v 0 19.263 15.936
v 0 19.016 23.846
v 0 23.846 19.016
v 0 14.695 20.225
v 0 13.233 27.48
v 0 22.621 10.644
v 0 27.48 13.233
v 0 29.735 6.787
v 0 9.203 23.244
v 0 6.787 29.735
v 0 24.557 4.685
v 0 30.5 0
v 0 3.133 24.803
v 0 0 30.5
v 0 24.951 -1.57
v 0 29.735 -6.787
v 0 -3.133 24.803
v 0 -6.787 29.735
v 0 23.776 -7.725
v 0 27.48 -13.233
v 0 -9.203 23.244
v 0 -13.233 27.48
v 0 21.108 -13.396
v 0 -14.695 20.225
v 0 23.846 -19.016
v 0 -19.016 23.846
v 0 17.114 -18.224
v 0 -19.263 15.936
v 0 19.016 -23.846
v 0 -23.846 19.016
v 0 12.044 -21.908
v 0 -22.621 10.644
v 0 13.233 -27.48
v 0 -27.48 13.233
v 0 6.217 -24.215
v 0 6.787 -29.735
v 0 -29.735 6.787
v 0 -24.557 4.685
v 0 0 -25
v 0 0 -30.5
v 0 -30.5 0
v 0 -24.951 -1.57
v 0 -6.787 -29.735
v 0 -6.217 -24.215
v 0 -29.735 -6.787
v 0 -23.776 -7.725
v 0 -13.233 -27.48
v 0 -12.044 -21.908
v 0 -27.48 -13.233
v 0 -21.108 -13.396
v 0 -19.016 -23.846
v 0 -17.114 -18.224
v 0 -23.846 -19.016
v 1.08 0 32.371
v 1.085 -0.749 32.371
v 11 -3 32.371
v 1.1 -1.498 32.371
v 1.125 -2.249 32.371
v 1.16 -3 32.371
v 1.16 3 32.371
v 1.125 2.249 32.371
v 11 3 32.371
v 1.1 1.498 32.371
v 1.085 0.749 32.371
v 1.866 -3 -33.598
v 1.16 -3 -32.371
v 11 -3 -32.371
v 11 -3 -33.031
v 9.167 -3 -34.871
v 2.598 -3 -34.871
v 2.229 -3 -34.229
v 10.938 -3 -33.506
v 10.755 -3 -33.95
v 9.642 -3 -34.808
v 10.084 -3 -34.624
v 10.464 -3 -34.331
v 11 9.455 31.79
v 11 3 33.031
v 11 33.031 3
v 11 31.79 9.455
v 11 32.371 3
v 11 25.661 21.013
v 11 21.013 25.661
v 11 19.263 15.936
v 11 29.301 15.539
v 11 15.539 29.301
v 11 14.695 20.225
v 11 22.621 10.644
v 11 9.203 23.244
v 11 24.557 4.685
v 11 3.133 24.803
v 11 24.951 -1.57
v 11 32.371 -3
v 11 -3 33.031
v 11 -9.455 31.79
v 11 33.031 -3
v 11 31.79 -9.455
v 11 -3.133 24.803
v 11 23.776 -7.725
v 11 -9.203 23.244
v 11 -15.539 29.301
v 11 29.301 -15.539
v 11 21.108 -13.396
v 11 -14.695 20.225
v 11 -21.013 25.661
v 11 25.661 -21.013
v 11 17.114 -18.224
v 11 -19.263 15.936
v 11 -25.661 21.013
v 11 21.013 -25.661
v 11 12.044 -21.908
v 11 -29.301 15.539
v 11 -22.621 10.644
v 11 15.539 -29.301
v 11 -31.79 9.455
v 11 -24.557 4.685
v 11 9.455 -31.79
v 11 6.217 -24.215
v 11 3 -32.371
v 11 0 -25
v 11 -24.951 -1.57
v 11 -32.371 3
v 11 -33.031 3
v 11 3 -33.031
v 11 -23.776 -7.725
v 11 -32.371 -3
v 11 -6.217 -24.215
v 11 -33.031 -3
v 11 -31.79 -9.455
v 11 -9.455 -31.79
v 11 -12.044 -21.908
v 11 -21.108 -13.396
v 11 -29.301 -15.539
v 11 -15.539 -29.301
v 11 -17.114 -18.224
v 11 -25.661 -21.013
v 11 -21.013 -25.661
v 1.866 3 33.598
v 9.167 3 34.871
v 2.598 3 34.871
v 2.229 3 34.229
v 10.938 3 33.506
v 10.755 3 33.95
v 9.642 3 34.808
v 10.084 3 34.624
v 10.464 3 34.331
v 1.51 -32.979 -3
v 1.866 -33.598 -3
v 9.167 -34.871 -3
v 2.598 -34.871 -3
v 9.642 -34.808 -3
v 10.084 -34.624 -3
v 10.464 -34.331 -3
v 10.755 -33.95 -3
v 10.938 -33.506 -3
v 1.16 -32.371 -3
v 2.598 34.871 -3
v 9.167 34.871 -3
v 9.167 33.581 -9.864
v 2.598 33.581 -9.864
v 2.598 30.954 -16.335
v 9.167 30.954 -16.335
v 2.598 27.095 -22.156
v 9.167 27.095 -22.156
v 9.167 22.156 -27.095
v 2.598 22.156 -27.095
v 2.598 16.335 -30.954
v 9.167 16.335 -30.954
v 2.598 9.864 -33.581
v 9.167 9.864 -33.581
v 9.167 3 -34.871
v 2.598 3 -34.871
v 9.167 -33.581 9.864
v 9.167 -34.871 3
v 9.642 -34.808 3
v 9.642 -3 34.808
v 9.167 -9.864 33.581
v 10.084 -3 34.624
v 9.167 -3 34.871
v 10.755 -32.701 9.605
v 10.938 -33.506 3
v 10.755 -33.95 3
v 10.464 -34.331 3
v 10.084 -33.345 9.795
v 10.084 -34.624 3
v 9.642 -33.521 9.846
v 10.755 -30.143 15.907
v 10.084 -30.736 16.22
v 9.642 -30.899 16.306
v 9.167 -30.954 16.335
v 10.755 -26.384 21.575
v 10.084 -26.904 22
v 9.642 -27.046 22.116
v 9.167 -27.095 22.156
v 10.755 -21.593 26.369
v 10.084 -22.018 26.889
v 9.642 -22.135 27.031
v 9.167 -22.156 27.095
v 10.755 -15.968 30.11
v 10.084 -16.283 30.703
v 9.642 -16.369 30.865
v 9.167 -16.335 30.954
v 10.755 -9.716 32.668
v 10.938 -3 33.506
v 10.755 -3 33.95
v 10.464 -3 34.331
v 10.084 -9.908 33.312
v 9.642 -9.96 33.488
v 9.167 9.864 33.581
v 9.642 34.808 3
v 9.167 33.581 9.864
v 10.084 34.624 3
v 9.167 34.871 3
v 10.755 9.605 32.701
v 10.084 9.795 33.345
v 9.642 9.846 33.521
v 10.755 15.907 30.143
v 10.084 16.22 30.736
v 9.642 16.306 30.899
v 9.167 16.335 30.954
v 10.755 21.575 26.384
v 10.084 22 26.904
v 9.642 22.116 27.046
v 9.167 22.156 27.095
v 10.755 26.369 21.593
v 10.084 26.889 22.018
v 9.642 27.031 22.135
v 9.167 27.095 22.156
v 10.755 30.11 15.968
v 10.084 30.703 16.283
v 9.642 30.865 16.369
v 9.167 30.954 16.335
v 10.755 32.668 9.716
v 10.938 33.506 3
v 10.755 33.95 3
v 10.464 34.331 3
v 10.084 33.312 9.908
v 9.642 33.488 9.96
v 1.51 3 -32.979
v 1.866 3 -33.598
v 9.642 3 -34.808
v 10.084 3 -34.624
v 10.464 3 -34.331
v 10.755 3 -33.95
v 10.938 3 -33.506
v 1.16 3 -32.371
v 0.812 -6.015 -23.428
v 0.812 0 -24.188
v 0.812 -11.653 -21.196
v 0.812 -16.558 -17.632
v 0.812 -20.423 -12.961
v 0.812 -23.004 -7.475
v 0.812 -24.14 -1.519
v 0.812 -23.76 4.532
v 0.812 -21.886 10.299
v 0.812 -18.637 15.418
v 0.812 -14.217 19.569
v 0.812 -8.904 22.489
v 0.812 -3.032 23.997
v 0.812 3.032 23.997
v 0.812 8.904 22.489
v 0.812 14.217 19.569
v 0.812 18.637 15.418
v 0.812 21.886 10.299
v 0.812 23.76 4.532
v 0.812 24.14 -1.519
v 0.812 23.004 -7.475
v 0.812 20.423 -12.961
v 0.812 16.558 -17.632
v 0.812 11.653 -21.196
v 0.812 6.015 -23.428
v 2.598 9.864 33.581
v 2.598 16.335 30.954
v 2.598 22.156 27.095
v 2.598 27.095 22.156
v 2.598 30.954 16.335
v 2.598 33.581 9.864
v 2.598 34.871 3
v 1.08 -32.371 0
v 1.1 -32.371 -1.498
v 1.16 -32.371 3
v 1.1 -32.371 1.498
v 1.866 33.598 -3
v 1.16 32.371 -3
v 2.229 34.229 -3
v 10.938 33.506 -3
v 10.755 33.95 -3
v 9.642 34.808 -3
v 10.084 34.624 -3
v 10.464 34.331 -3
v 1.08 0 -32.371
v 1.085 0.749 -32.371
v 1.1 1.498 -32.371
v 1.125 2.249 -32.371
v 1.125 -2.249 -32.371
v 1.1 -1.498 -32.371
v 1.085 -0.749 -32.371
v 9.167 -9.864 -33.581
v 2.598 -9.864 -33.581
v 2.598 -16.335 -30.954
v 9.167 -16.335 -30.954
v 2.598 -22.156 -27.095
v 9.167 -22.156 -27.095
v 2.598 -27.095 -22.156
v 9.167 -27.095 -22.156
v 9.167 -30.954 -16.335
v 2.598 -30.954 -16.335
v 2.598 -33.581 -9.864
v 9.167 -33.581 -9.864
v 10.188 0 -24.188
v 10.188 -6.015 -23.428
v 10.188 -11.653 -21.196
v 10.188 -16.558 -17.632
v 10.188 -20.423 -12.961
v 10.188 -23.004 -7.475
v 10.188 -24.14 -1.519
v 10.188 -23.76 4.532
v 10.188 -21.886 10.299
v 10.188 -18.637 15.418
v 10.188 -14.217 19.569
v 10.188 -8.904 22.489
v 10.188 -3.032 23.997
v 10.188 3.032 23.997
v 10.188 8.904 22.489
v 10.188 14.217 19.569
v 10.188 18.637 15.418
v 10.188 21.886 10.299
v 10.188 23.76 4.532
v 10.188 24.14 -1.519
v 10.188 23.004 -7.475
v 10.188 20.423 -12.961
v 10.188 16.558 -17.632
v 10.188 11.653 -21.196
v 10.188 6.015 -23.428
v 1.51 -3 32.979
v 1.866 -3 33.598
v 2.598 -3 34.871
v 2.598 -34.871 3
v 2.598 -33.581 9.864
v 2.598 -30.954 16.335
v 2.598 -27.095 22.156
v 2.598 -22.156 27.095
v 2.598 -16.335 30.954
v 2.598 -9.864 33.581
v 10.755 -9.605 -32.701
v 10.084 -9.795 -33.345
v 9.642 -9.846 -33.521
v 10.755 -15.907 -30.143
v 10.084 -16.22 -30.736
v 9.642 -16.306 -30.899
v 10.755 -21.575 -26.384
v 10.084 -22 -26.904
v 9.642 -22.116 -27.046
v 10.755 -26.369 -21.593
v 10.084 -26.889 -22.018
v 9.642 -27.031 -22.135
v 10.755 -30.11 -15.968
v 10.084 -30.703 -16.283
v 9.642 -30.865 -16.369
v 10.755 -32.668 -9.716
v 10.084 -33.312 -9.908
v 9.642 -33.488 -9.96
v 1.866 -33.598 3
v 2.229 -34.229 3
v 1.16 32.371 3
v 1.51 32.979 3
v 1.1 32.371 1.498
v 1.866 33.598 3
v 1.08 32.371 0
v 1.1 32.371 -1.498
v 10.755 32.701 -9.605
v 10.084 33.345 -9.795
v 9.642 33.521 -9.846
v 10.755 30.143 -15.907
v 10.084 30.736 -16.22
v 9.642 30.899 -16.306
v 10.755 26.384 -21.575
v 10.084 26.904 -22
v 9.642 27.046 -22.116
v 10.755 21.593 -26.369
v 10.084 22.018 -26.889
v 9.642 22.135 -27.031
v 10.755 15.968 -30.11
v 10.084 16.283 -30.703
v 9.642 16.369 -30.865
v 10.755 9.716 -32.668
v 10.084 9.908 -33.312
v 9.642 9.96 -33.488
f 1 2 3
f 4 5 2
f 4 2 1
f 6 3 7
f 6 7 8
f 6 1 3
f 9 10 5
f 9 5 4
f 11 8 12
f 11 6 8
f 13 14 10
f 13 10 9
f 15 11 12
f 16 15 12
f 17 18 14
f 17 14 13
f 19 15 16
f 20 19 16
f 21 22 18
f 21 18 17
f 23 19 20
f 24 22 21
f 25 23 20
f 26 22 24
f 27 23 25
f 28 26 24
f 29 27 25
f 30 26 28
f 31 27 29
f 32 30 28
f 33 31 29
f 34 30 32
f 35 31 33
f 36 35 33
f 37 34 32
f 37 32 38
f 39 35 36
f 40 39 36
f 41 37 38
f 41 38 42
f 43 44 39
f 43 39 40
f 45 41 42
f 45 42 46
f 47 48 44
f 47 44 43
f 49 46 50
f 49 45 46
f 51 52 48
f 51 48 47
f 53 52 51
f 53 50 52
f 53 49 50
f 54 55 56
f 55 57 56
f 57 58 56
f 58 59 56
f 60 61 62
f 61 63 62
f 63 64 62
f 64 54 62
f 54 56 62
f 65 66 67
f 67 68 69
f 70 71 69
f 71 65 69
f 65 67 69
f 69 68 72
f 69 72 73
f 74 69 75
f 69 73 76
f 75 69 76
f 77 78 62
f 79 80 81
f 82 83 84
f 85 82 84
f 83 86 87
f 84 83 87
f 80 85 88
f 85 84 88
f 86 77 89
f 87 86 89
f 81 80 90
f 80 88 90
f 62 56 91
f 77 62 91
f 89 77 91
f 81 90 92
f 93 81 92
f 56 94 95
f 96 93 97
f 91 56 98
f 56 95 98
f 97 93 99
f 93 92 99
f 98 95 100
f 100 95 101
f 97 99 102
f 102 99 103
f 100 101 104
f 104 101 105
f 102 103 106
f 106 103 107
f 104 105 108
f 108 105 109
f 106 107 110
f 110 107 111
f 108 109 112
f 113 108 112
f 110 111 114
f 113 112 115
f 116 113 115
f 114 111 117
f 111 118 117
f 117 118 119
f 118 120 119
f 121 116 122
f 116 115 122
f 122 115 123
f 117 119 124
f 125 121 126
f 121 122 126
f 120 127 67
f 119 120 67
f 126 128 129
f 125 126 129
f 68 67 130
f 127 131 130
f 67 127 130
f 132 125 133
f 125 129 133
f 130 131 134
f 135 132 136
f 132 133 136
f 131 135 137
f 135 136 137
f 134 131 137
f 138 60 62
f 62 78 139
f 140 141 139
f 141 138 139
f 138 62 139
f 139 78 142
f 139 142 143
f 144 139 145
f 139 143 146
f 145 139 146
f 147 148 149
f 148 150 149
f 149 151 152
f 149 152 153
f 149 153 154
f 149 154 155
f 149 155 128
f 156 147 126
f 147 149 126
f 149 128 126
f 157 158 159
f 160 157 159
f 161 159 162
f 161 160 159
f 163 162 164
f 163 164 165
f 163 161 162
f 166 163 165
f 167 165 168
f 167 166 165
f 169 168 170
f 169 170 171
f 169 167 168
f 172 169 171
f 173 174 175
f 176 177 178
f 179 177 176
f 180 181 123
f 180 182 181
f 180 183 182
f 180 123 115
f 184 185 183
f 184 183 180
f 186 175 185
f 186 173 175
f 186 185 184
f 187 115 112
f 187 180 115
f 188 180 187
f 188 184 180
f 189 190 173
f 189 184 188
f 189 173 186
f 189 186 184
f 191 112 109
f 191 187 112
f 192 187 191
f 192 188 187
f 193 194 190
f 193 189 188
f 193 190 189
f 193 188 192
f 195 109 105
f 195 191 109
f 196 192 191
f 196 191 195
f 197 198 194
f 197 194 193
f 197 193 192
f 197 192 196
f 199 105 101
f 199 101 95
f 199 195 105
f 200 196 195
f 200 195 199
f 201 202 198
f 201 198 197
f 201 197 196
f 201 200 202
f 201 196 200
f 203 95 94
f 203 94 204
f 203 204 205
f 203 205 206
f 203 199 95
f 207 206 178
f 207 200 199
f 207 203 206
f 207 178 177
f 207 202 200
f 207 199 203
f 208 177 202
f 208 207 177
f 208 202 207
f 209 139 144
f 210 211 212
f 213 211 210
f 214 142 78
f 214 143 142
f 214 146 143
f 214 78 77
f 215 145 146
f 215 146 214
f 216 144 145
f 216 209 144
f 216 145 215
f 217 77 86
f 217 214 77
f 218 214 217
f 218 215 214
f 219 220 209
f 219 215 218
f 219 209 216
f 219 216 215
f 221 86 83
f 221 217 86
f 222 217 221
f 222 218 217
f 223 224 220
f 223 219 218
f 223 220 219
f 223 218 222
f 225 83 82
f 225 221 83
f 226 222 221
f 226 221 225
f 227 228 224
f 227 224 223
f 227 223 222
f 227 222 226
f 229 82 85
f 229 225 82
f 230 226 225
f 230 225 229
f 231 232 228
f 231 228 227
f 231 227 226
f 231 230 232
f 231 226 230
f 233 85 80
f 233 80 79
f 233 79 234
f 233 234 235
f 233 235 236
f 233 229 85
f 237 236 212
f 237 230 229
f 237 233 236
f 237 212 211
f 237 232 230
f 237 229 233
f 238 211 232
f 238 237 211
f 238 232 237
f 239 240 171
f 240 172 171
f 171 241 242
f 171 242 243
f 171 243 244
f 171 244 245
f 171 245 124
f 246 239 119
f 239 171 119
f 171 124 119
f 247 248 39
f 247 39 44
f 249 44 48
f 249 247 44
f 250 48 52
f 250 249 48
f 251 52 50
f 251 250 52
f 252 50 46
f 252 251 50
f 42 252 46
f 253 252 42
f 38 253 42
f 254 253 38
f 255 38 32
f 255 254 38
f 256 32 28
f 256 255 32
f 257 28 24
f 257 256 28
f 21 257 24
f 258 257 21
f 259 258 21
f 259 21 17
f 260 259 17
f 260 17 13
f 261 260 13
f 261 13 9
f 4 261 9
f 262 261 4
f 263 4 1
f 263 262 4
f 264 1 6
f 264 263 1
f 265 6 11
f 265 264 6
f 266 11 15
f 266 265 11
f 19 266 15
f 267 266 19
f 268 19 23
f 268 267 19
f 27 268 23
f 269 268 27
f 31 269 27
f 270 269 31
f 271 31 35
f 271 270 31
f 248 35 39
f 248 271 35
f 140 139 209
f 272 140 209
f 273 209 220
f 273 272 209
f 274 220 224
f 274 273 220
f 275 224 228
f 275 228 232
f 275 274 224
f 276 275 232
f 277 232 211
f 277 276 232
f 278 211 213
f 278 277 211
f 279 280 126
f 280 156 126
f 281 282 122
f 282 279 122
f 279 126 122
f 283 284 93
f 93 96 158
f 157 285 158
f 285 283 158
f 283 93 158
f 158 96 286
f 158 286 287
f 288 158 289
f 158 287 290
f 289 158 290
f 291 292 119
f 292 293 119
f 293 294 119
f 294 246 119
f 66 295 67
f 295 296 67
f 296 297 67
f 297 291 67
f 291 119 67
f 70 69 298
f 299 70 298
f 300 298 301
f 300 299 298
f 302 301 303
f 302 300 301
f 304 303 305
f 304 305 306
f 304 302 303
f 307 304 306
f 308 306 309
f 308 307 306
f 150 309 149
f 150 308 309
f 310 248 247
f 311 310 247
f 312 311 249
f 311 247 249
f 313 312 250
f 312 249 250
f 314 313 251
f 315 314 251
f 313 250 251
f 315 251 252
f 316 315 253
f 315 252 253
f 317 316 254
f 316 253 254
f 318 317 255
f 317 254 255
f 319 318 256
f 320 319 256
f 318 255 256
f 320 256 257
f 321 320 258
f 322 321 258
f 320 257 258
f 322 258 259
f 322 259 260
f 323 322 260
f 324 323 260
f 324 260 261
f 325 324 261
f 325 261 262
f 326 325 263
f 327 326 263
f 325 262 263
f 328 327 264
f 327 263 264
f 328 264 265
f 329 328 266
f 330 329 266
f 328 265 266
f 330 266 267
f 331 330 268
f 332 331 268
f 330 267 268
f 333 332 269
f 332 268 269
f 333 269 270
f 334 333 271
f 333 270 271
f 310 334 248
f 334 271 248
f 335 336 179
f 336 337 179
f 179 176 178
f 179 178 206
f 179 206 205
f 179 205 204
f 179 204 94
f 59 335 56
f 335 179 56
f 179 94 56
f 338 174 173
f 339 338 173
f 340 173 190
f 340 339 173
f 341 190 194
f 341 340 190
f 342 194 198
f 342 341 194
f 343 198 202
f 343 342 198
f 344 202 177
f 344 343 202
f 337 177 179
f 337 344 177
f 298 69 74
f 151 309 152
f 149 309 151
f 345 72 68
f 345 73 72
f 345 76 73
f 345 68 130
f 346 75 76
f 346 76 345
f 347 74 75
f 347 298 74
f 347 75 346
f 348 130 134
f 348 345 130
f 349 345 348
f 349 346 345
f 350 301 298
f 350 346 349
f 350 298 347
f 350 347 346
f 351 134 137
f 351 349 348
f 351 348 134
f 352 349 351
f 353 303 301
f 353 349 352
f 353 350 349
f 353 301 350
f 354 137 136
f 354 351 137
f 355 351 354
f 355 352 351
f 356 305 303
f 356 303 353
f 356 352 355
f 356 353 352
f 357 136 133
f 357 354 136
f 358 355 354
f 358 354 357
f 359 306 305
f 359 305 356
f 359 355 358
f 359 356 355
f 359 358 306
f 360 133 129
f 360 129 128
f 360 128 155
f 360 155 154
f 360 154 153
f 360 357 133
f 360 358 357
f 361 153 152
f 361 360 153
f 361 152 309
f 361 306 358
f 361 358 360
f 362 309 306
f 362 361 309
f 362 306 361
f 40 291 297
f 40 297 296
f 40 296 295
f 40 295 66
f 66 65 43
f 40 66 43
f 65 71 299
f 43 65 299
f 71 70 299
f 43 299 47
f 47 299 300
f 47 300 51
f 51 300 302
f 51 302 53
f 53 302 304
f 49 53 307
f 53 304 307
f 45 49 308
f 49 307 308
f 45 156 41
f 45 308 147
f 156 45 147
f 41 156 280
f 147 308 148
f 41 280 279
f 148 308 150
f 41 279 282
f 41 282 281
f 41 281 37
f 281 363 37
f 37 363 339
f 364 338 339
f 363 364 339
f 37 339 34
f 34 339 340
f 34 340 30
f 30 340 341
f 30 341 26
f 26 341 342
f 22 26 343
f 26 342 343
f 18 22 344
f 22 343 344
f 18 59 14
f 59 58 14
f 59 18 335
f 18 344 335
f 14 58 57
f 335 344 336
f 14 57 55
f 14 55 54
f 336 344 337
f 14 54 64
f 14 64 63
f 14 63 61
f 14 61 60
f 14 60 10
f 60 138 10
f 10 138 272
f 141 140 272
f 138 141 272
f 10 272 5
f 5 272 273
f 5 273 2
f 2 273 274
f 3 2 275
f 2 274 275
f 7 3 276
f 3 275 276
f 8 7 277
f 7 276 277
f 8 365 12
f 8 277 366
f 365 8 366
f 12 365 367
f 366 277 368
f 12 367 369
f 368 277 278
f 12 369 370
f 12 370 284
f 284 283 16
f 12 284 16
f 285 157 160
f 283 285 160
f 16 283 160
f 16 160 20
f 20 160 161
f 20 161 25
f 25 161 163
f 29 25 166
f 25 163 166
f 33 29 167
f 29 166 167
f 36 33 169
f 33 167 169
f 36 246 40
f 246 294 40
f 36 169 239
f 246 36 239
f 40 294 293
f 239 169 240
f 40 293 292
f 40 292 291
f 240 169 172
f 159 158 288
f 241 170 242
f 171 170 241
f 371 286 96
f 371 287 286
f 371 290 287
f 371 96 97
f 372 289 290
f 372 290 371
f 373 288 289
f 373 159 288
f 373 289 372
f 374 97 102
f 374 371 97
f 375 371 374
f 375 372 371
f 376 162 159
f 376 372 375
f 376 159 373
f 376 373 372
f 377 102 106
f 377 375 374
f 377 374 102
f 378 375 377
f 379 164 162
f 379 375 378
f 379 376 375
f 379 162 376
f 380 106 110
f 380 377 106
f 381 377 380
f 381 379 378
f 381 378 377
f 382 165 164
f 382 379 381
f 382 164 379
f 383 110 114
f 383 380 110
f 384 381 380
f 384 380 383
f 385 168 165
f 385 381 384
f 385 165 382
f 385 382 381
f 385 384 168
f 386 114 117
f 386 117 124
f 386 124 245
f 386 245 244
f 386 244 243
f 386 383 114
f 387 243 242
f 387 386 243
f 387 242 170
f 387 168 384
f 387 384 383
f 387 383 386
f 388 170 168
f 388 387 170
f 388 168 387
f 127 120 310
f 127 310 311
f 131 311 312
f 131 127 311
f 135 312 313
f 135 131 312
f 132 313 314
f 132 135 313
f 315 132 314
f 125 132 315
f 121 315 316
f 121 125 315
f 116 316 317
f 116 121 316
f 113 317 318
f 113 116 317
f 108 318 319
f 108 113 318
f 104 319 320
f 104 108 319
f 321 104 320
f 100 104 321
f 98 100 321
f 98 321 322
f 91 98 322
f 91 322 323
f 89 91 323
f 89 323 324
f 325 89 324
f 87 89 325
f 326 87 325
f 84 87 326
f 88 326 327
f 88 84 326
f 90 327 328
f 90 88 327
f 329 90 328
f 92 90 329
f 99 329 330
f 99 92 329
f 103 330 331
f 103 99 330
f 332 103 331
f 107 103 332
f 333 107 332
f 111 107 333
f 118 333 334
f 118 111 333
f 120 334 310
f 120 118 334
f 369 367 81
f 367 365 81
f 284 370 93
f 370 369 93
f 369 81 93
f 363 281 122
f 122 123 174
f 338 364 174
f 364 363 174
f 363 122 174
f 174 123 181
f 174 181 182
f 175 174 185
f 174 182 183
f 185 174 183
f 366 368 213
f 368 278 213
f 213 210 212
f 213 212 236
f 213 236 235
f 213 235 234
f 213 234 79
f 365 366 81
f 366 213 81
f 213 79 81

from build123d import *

# Parameters (mm, degrees)
SKETCH1_R           = 35
SKETCH1_R_2         = 24.188
BOSS_EXTRUDE1_DEPTH = 11
CHAMFER1_SIZE       = 4.5
CHAMFER1_SIZE2      = 2.598076211
CUT_EXTRUDE1_REACH  = 52.705
CUT_EXTRUDE2_REACH  = 52.705
CUT_EXTRUDE3_REACH  = 52.705
CUT_EXTRUDE4_REACH  = 52.616
CHAMFER2_SIZE       = 0.812
CHAMFER3_SIZE       = 0.812
FILLET1_R           = 1.833333333
FILLET2_R           = 1.833333333


with BuildPart() as part:
    # Sketch1 → Boss-Extrude1 (new body)
    with BuildSketch(Plane(origin=(0, 0, 0), x_dir=(0, -1, 0), z_dir=(-1, 0, 0))):
        with Locations(Location((0, 0, 0), (0, 0, 270))):
            Circle(SKETCH1_R)
        with Locations(Location((0, 0, 0), (0, 0, 270))):
            Circle(SKETCH1_R_2, mode=Mode.SUBTRACT)
    extrude(amount=-BOSS_EXTRUDE1_DEPTH)

    # Chamfer1
    chamfer1_edges = [part.edges().sort_by_distance(p)[0] for p in [
        (0, 0, 35),
    ]]
    chamfer1_side = [part.faces().sort_by_distance(p)[0] for p in [
        (0, 0, 34.010050506),
    ]]
    chamfer(chamfer1_edges, length=CHAMFER1_SIZE, length2=CHAMFER1_SIZE2, reference=chamfer1_side[0])

    # Cut-Extrude1: up to this cone (the profile starts inside it)
    cut_extrude1_end = Plane(origin=(11, 0, 0), z_dir=(1, 0, 0)).offset(-28.60918221) * Cone(1.732e-06, 227.533871731, 131.366741094, align=(Align.CENTER, Align.CENTER, Align.MIN), mode=Mode.PRIVATE)
    # Sketch2 → Cut-Extrude1 (cut, up to the surface)
    with BuildSketch(Plane(origin=(11, 0, 0), x_dir=(0, 0, -1), z_dir=(1, 0, 0)), mode=Mode.PRIVATE) as cut_extrude1_sk1:
        with BuildLine():
            Line((34.871191548, 3), (32.371191548, 3))
            Line((32.371191548, 3), (32.371191548, -3))
            Line((32.371191548, -3), (34.871191548, -3))
            ThreePointArc((34.871191548, -3), (35, 0), (34.871191548, 3))
        make_face()
    cut_extrude1_tool1 = extrude(cut_extrude1_sk1.sketch, amount=-CUT_EXTRUDE1_REACH, mode=Mode.PRIVATE) & cut_extrude1_end
    add(cut_extrude1_tool1.solids().sort_by_distance((11, 0, -33.664429))[0], mode=Mode.SUBTRACT)

    # Cut-Extrude2: up to this cone (the profile starts inside it)
    cut_extrude2_end = Plane(origin=(11, 0, 0), z_dir=(1, 0, 0)).offset(-28.60918221) * Cone(1.732e-06, 227.533871731, 131.366741094, align=(Align.CENTER, Align.CENTER, Align.MIN), mode=Mode.PRIVATE)
    # Sketch3 → Cut-Extrude2 (cut, up to the surface)
    with BuildSketch(Plane(origin=(11, 0, 0), x_dir=(0, 0, -1), z_dir=(1, 0, 0)), mode=Mode.PRIVATE) as cut_extrude2_sk1:
        with BuildLine():
            Line((3, -34.871191548), (3, -32.371191548))
            Line((3, -32.371191548), (-3, -32.371191548))
            Line((-3, -32.371191548), (-3, -34.871191548))
            ThreePointArc((-3, -34.871191548), (0, -35), (3, -34.871191548))
        make_face()
    cut_extrude2_tool1 = extrude(cut_extrude2_sk1.sketch, amount=-CUT_EXTRUDE2_REACH, mode=Mode.PRIVATE) & cut_extrude2_end
    add(cut_extrude2_tool1.solids().sort_by_distance((11, -33.664429, 0))[0], mode=Mode.SUBTRACT)

    # Cut-Extrude3: up to this cone (the profile starts inside it)
    cut_extrude3_end = Plane(origin=(11, 0, 0), z_dir=(1, 0, 0)).offset(-28.60918221) * Cone(1.732e-06, 227.533871731, 131.366741094, align=(Align.CENTER, Align.CENTER, Align.MIN), mode=Mode.PRIVATE)
    # Sketch4 → Cut-Extrude3 (cut, up to the surface)
    with BuildSketch(Plane(origin=(11, 0, 0), x_dir=(0, 0, -1), z_dir=(1, 0, 0)), mode=Mode.PRIVATE) as cut_extrude3_sk1:
        with BuildLine():
            Line((-34.871191548, -3), (-32.371191548, -3))
            Line((-32.371191548, -3), (-32.371191548, 3))
            Line((-32.371191548, 3), (-34.871191548, 3))
            ThreePointArc((-34.871191548, 3), (-35, 0), (-34.871191548, -3))
        make_face()
    cut_extrude3_tool1 = extrude(cut_extrude3_sk1.sketch, amount=-CUT_EXTRUDE3_REACH, mode=Mode.PRIVATE) & cut_extrude3_end
    add(cut_extrude3_tool1.solids().sort_by_distance((11, 0, 33.664429))[0], mode=Mode.SUBTRACT)

    # Cut-Extrude4: up to this cone (the profile starts inside it)
    cut_extrude4_end = Plane(origin=(11, 0, 0), z_dir=(1, 0, 0)).offset(-28.60918221) * Cone(1.732e-06, 227.379719209, 131.277741094, align=(Align.CENTER, Align.CENTER, Align.MIN), mode=Mode.PRIVATE)
    # Sketch5 → Cut-Extrude4 (cut, up to the surface)
    with BuildSketch(Plane(origin=(11, 0, 0), x_dir=(0, 0, -1), z_dir=(1, 0, 0)), mode=Mode.PRIVATE) as cut_extrude4_sk1:
        with BuildLine():
            Line((-3, 34.871191548), (-3, 32.371191548))
            Line((-3, 32.371191548), (3, 32.371191548))
            Line((3, 32.371191548), (3, 34.871191548))
            ThreePointArc((3, 34.871191548), (0, 35), (-3, 34.871191548))
        make_face()
    cut_extrude4_tool1 = extrude(cut_extrude4_sk1.sketch, amount=-CUT_EXTRUDE4_REACH, mode=Mode.PRIVATE) & cut_extrude4_end
    add(cut_extrude4_tool1.solids().sort_by_distance((11, 33.664429, 0))[0], mode=Mode.SUBTRACT)

    # Chamfer2
    chamfer2_edges = [part.edges().sort_by_distance(p)[0] for p in [
        (0, 0, 24.188),
    ]]
    chamfer(chamfer2_edges, length=CHAMFER2_SIZE)

    # Chamfer3
    chamfer3_edges = [part.edges().sort_by_distance(p)[0] for p in [
        (11, 0, 24.188),
    ]]
    chamfer(chamfer3_edges, length=CHAMFER3_SIZE)

    # Fillet1
    fillet1_edges = [part.edges().sort_by_distance(p)[0] for p in [
        (11, -24.748737342, 24.748737342),
        (11, 24.748737342, 24.748737342),
        (11, -24.748737342, -24.748737342),
    ]]
    fillet(fillet1_edges, radius=FILLET1_R)

    # Fillet2
    fillet2_edges = [part.edges().sort_by_distance(p)[0] for p in [
        (11, 24.748737342, -24.748737342),
    ]]
    fillet(fillet2_edges, radius=FILLET2_R)


solid = part.part
